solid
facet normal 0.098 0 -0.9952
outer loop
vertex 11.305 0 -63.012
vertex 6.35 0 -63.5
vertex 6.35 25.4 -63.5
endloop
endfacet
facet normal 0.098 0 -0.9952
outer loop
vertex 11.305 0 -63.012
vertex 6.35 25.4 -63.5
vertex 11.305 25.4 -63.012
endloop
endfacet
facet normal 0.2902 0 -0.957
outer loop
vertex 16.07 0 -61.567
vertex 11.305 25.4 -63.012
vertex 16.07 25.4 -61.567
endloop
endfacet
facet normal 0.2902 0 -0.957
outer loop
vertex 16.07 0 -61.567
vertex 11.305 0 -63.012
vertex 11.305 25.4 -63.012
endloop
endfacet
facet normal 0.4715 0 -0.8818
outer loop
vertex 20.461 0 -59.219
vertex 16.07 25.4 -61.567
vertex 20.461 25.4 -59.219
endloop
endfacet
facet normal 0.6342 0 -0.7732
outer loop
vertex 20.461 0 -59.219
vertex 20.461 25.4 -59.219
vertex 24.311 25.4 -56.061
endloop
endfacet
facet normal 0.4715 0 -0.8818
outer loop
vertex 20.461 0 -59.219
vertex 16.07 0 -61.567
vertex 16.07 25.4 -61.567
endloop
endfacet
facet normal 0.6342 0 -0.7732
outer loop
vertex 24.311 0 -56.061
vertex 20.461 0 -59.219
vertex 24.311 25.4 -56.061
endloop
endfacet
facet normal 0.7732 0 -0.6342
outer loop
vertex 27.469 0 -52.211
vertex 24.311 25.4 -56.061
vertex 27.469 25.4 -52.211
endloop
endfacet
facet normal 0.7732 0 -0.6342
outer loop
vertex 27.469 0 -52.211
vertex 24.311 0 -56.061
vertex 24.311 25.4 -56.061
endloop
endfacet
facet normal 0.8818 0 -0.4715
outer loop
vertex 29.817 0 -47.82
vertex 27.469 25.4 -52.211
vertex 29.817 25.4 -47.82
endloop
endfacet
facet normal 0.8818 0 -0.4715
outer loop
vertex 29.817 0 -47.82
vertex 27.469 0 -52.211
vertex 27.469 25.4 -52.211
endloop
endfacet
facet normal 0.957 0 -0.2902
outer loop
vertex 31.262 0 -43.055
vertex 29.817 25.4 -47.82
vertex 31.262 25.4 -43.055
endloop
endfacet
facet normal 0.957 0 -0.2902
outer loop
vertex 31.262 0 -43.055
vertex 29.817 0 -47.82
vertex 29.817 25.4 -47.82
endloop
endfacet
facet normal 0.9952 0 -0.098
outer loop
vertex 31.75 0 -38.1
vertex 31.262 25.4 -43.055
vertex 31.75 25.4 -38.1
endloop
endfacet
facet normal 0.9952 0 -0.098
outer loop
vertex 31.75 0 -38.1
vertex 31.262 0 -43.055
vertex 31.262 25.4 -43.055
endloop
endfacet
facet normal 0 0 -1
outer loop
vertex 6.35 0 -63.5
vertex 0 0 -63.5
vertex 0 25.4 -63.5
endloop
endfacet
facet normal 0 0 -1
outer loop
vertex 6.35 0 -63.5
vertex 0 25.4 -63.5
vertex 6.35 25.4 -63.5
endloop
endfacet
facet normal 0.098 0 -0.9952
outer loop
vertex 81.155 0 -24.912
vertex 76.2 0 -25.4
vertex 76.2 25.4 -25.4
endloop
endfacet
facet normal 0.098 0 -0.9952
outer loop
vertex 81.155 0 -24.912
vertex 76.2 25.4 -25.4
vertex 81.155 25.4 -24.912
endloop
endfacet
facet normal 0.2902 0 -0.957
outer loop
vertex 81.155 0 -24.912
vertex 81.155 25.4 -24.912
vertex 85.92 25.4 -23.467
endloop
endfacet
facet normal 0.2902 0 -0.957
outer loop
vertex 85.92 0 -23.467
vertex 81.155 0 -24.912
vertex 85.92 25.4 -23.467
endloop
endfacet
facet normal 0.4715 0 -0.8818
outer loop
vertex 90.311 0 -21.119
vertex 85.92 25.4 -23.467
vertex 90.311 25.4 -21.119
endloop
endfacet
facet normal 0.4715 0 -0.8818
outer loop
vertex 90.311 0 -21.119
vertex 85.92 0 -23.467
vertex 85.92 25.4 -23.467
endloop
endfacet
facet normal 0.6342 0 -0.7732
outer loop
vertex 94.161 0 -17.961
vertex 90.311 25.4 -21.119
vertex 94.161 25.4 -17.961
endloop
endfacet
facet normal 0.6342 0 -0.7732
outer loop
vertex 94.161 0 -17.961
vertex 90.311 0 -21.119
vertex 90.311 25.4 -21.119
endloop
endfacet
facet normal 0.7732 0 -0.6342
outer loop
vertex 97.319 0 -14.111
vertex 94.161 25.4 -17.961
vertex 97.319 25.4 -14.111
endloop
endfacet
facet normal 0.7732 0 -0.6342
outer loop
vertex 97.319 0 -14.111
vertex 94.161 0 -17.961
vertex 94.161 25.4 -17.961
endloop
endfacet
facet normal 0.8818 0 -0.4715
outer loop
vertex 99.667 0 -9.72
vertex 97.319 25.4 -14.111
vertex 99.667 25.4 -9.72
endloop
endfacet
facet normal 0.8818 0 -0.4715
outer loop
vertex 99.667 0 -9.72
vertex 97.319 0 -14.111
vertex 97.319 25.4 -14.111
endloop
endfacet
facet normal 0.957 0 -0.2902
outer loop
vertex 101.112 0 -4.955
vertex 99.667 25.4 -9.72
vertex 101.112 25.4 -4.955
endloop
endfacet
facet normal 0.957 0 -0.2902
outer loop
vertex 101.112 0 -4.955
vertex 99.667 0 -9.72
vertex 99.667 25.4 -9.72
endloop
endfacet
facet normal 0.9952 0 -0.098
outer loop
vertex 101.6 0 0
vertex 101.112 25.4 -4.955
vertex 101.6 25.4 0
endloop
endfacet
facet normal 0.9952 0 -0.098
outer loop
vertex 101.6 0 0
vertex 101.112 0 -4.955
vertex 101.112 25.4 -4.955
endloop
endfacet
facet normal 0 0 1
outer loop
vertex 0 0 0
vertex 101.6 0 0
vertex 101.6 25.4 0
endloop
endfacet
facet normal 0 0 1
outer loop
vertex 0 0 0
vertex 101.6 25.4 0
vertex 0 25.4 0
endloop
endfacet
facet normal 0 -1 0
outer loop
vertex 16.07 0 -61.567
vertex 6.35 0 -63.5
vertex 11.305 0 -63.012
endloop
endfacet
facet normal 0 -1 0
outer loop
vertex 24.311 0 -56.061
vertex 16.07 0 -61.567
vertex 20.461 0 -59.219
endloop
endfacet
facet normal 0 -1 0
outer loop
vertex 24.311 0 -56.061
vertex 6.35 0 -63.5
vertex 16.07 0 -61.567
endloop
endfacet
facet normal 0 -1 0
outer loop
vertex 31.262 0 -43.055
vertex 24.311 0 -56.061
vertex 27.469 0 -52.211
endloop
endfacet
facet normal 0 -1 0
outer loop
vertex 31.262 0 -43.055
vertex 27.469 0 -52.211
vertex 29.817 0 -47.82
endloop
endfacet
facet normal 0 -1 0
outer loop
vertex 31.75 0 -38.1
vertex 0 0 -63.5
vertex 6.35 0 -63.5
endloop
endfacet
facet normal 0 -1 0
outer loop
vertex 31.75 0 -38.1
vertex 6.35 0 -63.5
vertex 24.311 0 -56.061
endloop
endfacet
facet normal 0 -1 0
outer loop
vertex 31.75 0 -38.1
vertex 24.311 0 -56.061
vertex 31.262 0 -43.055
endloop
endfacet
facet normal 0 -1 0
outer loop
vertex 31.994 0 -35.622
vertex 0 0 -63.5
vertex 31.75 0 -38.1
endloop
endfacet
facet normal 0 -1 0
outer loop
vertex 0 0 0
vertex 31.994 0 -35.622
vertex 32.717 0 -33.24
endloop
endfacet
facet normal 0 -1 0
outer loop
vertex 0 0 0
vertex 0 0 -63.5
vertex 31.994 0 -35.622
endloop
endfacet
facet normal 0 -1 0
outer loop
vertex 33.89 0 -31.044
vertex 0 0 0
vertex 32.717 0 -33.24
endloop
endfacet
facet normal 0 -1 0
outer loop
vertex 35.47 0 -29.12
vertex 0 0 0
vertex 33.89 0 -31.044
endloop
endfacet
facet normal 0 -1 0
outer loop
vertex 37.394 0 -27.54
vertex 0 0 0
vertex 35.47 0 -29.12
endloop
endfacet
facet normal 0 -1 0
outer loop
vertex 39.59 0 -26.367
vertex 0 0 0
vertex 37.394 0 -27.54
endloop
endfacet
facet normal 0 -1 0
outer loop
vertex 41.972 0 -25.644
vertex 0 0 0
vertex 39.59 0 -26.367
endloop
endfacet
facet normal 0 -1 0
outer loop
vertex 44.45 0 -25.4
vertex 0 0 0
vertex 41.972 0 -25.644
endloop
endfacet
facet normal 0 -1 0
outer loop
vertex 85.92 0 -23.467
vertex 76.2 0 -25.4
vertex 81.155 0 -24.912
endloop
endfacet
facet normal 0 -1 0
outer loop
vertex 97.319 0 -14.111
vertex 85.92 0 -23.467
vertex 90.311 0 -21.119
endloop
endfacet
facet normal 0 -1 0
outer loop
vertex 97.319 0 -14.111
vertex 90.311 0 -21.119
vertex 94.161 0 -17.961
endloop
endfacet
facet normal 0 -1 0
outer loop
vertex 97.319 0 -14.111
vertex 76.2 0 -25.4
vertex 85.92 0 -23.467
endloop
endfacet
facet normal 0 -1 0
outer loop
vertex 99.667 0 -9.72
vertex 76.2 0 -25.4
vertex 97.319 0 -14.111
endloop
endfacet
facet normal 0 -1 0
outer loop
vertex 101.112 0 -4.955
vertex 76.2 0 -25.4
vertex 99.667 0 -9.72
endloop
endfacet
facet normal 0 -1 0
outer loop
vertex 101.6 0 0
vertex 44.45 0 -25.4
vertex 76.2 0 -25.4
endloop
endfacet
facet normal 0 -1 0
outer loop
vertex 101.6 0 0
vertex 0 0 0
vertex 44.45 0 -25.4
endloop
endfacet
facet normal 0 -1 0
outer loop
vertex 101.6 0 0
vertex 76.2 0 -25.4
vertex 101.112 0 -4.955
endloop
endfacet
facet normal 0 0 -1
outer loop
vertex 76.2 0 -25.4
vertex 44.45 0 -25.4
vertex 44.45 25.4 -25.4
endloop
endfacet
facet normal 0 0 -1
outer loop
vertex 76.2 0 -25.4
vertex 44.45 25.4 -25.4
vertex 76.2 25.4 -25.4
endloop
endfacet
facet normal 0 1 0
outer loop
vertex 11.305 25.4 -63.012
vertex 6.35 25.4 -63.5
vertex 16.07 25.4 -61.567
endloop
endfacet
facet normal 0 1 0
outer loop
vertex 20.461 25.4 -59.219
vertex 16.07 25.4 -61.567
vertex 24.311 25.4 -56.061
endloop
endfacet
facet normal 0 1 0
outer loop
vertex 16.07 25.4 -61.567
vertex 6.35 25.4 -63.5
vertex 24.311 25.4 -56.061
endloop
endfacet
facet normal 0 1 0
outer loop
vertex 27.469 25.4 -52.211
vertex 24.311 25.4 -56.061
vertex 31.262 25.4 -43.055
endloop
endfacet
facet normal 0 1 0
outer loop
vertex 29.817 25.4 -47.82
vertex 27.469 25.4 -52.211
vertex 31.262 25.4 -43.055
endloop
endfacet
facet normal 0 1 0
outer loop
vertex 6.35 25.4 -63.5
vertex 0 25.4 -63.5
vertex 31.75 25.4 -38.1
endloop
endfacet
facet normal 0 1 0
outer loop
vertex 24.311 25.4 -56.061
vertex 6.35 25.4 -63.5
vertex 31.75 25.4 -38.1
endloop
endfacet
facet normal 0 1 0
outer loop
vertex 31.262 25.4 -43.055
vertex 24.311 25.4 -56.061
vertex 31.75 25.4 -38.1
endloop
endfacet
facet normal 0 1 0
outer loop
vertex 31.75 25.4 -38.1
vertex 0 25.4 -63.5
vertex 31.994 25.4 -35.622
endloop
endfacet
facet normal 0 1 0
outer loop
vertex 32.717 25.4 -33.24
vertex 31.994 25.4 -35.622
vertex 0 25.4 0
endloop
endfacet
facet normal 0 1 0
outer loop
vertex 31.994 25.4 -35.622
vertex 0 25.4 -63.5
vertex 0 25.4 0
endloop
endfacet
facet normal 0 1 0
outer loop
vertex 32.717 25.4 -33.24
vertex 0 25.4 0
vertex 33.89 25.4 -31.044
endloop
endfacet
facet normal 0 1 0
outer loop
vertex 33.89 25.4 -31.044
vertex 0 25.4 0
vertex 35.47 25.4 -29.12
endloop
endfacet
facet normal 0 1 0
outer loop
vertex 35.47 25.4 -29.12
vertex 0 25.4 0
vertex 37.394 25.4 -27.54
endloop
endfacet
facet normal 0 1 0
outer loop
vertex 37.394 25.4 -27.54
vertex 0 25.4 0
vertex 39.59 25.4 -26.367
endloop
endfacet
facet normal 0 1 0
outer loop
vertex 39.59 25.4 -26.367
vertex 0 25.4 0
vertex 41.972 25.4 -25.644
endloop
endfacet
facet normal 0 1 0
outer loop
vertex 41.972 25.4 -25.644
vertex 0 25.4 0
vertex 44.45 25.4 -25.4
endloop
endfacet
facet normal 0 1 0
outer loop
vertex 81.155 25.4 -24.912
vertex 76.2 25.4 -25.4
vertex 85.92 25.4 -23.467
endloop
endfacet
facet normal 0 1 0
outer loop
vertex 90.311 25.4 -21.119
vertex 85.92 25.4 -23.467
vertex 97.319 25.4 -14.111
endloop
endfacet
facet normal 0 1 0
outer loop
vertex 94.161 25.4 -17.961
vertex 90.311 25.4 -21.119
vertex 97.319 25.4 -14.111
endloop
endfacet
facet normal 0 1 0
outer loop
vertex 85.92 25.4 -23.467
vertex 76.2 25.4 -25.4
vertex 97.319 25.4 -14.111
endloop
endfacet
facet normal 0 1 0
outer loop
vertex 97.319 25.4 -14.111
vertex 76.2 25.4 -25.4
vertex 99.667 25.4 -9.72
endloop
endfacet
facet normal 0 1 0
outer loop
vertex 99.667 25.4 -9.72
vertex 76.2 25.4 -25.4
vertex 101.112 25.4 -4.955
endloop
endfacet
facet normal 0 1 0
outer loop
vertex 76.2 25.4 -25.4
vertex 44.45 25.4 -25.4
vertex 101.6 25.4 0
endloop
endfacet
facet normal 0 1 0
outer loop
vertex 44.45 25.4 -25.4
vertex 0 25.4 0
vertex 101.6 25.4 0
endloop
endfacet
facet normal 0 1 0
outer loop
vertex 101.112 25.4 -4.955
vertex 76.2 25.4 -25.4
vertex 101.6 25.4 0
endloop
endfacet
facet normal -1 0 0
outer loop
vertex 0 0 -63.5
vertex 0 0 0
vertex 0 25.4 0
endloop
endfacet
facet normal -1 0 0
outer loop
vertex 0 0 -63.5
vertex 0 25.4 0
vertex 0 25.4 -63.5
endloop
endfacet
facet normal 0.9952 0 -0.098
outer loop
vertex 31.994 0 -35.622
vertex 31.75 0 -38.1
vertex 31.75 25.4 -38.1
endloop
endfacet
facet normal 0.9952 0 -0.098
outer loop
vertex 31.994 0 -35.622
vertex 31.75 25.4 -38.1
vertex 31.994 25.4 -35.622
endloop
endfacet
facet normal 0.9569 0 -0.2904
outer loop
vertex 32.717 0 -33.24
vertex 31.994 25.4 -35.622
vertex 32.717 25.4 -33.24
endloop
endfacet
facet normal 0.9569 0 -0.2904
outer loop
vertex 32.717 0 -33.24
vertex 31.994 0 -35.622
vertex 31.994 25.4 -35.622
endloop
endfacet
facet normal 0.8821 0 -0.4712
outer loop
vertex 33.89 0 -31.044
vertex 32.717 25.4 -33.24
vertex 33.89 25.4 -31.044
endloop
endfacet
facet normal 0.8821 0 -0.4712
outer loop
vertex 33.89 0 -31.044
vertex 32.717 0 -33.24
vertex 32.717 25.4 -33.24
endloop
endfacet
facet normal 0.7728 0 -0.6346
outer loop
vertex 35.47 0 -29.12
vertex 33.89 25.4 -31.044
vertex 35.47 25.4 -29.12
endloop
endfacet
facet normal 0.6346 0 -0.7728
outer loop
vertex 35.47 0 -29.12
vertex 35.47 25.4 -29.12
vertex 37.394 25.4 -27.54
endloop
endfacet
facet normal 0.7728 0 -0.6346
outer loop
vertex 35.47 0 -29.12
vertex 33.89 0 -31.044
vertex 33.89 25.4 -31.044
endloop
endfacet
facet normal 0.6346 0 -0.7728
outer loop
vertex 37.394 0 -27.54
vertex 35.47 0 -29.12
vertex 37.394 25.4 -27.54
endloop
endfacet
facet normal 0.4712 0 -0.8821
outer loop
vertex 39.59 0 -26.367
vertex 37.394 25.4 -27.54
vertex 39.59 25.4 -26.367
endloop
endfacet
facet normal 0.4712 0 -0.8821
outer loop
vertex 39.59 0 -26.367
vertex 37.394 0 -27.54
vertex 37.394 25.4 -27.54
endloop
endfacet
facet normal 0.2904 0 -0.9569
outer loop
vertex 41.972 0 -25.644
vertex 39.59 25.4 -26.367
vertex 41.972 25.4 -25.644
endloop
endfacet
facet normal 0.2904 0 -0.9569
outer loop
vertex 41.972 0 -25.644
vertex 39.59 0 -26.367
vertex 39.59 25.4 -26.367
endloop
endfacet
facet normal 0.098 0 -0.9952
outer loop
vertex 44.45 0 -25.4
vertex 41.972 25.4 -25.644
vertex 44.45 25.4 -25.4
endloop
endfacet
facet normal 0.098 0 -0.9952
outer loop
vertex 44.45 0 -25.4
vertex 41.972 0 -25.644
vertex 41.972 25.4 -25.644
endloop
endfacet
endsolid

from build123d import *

# Parameters (mm, degrees)
F1_DEPTH = 25.4


with BuildPart() as f1:
    # F0 (on Front) → F1 (new body)
    with BuildSketch(Plane.XZ):
        with BuildLine():
            Line((101.6, 0), (0, 0))
            Line((0, 0), (0, -63.5))
            Line((0, -63.5), (6.35, -63.5))
            ThreePointArc((6.35, -63.5), (24.310512, -56.060512), (31.75, -38.1))
            ThreePointArc((31.75, -38.1), (35.469744, -29.119744), (44.45, -25.4))
            Line((44.45, -25.4), (76.2, -25.4))
            ThreePointArc((76.2, -25.4), (94.160512, -17.960512), (101.6, 0))
        make_face()
    extrude(amount=-F1_DEPTH)


solid = f1.part
